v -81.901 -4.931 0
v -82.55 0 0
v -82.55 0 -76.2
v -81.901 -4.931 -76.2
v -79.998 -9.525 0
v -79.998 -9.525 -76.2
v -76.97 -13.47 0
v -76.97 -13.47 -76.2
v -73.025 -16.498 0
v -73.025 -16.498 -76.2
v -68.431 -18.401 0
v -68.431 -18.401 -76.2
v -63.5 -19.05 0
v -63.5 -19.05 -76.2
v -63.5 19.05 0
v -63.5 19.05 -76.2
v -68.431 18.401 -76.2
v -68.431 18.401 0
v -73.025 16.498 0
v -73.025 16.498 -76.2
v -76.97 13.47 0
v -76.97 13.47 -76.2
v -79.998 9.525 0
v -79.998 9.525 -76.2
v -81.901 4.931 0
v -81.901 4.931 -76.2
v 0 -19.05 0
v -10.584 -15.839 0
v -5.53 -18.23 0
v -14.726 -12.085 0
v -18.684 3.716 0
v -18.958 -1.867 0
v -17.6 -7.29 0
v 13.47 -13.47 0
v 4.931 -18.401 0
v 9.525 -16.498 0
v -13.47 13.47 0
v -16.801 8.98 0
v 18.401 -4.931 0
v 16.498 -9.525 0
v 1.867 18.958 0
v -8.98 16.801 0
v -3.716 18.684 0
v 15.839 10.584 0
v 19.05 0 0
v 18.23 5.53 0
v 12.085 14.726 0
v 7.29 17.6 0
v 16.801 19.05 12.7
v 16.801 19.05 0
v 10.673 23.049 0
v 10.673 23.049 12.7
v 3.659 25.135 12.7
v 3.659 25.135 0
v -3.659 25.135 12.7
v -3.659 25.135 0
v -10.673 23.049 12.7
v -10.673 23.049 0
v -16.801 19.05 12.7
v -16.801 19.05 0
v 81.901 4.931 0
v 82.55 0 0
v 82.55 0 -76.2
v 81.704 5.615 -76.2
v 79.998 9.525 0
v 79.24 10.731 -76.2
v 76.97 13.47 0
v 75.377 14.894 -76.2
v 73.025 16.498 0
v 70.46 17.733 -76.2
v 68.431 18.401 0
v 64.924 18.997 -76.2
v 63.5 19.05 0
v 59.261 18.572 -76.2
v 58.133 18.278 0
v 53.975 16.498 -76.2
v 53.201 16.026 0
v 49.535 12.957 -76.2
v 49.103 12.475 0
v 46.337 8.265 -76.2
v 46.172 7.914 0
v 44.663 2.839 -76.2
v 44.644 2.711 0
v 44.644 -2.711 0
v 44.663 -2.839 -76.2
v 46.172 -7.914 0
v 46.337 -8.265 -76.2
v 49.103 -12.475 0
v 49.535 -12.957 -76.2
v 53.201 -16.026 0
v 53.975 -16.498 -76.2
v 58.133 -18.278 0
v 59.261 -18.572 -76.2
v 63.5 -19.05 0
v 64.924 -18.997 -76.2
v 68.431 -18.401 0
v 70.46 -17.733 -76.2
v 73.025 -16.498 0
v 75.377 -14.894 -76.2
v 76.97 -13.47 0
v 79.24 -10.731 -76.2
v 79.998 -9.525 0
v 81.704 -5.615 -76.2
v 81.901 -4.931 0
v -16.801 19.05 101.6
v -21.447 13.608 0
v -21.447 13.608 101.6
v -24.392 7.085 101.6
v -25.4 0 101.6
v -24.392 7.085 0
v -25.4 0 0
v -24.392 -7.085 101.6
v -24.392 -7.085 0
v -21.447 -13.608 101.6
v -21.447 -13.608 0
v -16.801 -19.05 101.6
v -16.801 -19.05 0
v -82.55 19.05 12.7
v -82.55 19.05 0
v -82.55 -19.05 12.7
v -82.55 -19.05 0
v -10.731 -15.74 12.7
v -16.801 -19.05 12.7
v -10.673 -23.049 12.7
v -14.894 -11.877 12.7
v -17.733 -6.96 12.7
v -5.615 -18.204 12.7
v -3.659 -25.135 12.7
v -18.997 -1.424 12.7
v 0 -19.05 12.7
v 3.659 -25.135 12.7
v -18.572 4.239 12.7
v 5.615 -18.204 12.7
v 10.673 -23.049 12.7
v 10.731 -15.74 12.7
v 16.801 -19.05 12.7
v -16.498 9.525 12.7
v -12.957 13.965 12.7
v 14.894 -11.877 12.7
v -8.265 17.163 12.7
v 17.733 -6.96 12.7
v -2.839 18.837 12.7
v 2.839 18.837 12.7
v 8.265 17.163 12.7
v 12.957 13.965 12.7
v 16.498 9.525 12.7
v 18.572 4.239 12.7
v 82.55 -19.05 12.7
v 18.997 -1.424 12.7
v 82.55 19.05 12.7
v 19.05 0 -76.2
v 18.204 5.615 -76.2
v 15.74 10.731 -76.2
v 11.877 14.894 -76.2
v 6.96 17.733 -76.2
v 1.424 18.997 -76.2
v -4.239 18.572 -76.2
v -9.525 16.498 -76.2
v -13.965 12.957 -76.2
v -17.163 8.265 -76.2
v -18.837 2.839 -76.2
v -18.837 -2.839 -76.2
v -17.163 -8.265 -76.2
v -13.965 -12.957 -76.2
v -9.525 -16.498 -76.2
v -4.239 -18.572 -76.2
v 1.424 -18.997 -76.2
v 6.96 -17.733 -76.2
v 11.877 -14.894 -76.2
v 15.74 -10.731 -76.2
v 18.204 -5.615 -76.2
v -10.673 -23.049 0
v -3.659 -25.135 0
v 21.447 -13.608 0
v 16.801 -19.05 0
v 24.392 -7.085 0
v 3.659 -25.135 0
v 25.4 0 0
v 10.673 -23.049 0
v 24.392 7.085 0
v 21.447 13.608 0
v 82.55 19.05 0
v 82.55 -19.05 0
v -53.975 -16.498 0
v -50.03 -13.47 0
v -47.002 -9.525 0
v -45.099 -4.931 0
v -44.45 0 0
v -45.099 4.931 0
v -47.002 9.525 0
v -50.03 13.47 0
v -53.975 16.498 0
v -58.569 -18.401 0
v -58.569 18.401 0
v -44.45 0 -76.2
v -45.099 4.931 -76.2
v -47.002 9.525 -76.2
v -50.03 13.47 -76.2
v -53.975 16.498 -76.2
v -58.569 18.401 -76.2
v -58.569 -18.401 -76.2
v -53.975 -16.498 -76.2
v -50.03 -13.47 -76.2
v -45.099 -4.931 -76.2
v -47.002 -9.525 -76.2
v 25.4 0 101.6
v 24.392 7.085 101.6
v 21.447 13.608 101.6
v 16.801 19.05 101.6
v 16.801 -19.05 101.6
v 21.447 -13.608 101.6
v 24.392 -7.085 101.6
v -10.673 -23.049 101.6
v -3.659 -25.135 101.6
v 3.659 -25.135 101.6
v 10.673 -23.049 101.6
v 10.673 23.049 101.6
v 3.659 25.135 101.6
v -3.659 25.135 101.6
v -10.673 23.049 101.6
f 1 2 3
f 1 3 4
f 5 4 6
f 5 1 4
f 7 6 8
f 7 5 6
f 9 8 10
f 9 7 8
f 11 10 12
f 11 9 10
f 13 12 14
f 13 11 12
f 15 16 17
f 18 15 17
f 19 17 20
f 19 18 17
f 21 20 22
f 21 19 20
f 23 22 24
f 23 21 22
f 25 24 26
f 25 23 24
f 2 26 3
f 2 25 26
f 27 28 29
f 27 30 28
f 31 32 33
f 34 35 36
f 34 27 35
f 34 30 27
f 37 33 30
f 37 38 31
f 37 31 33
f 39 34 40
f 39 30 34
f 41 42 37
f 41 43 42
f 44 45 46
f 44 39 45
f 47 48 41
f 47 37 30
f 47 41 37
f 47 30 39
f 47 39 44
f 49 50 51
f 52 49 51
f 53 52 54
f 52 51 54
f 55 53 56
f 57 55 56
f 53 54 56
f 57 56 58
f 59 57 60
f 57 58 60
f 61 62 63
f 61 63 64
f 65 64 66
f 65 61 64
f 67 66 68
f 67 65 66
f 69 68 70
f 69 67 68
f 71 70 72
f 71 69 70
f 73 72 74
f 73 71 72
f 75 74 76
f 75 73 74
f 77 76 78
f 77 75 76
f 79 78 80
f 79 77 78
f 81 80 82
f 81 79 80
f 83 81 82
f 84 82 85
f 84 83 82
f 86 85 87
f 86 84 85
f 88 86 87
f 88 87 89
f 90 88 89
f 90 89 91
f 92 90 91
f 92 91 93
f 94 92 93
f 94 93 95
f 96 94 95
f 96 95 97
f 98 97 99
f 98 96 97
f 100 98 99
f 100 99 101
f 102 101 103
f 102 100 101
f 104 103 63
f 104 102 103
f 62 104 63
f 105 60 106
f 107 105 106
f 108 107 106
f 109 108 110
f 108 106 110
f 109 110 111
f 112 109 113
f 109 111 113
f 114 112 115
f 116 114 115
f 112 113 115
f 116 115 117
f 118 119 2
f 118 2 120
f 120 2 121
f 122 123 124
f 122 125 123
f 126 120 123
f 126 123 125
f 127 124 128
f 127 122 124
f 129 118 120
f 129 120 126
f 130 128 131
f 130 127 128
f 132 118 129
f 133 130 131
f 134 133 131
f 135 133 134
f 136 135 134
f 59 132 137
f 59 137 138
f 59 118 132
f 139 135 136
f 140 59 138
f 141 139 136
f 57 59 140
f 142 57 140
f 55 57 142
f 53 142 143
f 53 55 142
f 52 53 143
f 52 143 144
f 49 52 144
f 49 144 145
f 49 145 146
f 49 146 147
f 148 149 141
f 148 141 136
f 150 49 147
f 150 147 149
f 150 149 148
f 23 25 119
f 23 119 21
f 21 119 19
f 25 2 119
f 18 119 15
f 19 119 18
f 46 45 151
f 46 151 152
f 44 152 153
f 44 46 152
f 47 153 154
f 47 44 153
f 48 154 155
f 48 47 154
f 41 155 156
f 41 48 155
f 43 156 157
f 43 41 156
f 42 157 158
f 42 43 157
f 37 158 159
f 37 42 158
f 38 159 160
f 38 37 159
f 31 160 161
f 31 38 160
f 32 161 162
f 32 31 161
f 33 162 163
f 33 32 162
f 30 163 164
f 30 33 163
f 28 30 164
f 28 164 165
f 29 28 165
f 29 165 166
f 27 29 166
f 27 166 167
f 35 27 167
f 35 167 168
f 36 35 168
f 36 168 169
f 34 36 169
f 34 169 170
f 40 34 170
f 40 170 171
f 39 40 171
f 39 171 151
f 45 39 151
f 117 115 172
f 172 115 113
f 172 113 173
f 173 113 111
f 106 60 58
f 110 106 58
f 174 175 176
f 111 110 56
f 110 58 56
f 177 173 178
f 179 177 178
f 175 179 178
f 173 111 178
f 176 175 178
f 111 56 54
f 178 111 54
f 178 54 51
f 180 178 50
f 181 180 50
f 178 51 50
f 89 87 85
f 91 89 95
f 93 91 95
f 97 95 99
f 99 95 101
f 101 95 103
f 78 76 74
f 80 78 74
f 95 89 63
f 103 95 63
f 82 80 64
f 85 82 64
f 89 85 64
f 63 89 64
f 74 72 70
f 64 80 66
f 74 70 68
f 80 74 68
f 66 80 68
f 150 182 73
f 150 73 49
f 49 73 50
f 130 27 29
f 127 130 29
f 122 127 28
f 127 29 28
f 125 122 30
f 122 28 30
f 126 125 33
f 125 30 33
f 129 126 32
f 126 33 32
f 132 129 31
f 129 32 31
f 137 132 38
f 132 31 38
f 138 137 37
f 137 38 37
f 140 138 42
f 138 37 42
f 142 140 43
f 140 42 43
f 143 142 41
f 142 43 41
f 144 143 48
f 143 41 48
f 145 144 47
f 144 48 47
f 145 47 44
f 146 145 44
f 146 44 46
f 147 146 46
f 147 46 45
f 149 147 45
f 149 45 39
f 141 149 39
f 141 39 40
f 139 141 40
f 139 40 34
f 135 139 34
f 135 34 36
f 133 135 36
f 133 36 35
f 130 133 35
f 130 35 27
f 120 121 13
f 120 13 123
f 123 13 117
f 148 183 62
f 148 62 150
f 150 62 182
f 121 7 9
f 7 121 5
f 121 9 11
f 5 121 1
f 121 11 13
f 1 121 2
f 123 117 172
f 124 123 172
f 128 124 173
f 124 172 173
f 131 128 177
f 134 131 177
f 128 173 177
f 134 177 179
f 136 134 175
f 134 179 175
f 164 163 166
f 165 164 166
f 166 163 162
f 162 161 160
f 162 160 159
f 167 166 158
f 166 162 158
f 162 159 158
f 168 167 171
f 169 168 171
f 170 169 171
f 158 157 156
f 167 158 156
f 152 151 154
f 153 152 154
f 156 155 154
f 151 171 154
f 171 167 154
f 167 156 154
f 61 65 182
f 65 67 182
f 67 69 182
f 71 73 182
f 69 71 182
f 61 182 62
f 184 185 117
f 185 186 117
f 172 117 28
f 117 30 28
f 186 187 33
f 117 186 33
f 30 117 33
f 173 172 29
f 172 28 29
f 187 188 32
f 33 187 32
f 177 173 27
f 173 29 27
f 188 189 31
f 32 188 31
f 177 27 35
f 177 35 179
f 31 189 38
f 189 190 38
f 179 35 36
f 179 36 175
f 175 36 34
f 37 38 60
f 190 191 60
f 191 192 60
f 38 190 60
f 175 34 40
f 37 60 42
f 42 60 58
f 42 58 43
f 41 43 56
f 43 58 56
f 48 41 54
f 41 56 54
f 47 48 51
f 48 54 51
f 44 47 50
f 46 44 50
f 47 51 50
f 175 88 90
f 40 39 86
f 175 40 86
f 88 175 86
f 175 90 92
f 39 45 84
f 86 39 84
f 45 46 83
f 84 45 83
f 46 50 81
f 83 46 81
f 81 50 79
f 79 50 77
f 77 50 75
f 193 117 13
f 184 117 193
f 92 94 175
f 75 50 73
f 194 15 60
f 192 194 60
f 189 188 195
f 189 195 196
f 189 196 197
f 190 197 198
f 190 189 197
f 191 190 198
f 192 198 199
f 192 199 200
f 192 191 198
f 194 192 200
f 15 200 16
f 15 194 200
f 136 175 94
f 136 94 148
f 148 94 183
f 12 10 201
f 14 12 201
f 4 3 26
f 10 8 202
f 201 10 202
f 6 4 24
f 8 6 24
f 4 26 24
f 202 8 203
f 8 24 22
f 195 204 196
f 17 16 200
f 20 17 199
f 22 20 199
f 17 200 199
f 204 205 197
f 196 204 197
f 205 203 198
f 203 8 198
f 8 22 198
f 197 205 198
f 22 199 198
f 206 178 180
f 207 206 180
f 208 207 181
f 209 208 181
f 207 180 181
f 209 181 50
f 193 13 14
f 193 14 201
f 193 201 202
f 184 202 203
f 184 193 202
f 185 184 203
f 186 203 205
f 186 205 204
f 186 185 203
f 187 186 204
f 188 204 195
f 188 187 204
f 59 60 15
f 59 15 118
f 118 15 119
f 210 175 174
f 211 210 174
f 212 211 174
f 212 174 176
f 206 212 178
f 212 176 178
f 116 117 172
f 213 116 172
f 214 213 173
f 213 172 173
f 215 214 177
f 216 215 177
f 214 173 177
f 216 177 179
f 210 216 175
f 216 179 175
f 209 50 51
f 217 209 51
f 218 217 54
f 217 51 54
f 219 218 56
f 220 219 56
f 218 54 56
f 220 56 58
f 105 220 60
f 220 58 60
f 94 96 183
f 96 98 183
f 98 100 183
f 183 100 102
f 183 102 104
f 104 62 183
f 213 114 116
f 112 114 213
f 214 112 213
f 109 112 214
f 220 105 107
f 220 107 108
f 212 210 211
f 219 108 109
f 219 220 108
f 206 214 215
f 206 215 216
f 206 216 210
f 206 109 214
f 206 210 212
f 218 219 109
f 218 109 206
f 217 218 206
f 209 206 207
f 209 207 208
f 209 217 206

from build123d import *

# Parameters (mm, degrees)
F1_DEPTH = 12.7
F2_DEPTH = 76.2
F3_DEPTH = 101.6


with BuildPart() as f1:
    # F0 (on Top) → F1 (new body)
    with BuildSketch(Plane.XY):
        with BuildLine():
            Line((82.55, 0), (82.55, 19.05))
            Line((82.55, 19.05), (63.5, 19.05))
            ThreePointArc((63.5, 19.05), (76.9703841816, 13.4703841816), (82.55, 0))
        make_face()
        with BuildLine():
            ThreePointArc((63.5, -19.05), (44.45, 0), (63.5, 19.05))
            Line((63.5, 19.05), (16.8005208253, 19.05))
            ThreePointArc((16.8005208253, 19.05), (23.1505208253, 10.4505208253), (25.4, 0))
            ThreePointArc((25.4, 0), (23.1505208253, -10.4505208253), (16.8005208253, -19.05))
            Line((16.8005208253, -19.05), (63.5, -19.05))
        make_face()
        with BuildLine():
            ThreePointArc((82.55, 0), (76.9703841816, 13.4703841816), (63.5, 19.05))
            ThreePointArc((63.5, 19.05), (44.45, 0), (63.5, -19.05))
            ThreePointArc((63.5, -19.05), (76.9703841816, -13.4703841816), (82.55, 0))
        make_face()
        with BuildLine():
            Line((82.55, -19.05), (82.55, 0))
            ThreePointArc((82.55, 0), (76.9703841816, -13.4703841816), (63.5, -19.05))
            Line((63.5, -19.05), (82.55, -19.05))
        make_face()
        with BuildLine():
            ThreePointArc((25.4, 0), (23.1505208253, 10.4505208253), (16.8005208253, 19.05))
            Line((16.8005208253, 19.05), (-5.96e-08, 19.05))
            ThreePointArc((-5.96e-08, 19.05), (13.4703841605, 13.4703842027), (19.05, 0))
            ThreePointArc((19.05, 0), (13.4703841555, -13.4703842077), (-7.38e-08, -19.05))
            Line((-7.38e-08, -19.05), (16.8005208253, -19.05))
            ThreePointArc((16.8005208253, -19.05), (23.1505208253, -10.4505208253), (25.4, 0))
        make_face()
        with BuildLine():
            Line((-5.96e-08, 19.05), (16.8005208253, 19.05))
            ThreePointArc((16.8005208253, 19.05), (0, 25.4), (-16.8005208253, 19.05))
            Line((-16.8005208253, 19.05), (-5.96e-08, 19.05))
        make_face()
        with BuildLine():
            ThreePointArc((-7.38e-08, -19.05), (-19.05, 7.1e-09), (-5.96e-08, 19.05))
            Line((-5.96e-08, 19.05), (-16.8005208253, 19.05))
            ThreePointArc((-16.8005208253, 19.05), (-25.4, 0), (-16.8005208253, -19.05))
            Line((-16.8005208253, -19.05), (-7.38e-08, -19.05))
        make_face()
        with BuildLine():
            ThreePointArc((-16.8005208253, -19.05), (-25.4, 0), (-16.8005208253, 19.05))
            Line((-16.8005208253, 19.05), (-63.5, 19.05))
            ThreePointArc((-63.5, 19.05), (-50.0296158184, 13.4703841816), (-44.45, 0))
            ThreePointArc((-44.45, 0), (-50.0296158184, -13.4703841816), (-63.5, -19.05))
            Line((-63.5, -19.05), (-16.8005208253, -19.05))
        make_face()
        with BuildLine():
            ThreePointArc((-16.8005208253, -19.05), (0, -25.4), (16.8005208253, -19.05))
            Line((16.8005208253, -19.05), (-7.38e-08, -19.05))
            Line((-7.38e-08, -19.05), (-16.8005208253, -19.05))
        make_face()
        with BuildLine():
            ThreePointArc((-82.55, 1.56e-07), (-76.9703841264, 13.4703842368), (-63.5, 19.05))
            Line((-63.5, 19.05), (-82.55, 19.05))
            Line((-82.55, 19.05), (-82.55, 1.56e-07))
        make_face()
        with BuildLine():
            ThreePointArc((-44.45, 0), (-50.0296158184, 13.4703841816), (-63.5, 19.05))
            ThreePointArc((-63.5, 19.05), (-76.9703841264, 13.4703842368), (-82.55, 1.56e-07))
            ThreePointArc((-82.55, 1.56e-07), (-76.9703842368, -13.4703841264), (-63.5, -19.05))
            ThreePointArc((-63.5, -19.05), (-50.0296158184, -13.4703841816), (-44.45, 0))
        make_face()
        with BuildLine():
            ThreePointArc((-63.5, -19.05), (-76.9703842368, -13.4703841264), (-82.55, 1.56e-07))
            Line((-82.55, 1.56e-07), (-82.55, -19.05))
            Line((-82.55, -19.05), (-63.5, -19.05))
        make_face()
    extrude(amount=F1_DEPTH)

    # F0 (on Top) → F2 (join)
    with BuildSketch(Plane.XY):
        with BuildLine():
            ThreePointArc((-44.45, 0), (-50.0296158184, 13.4703841816), (-63.5, 19.05))
            ThreePointArc((-63.5, 19.05), (-76.9703841264, 13.4703842368), (-82.55, 1.56e-07))
            ThreePointArc((-82.55, 1.56e-07), (-76.9703842368, -13.4703841264), (-63.5, -19.05))
            ThreePointArc((-63.5, -19.05), (-50.0296158184, -13.4703841816), (-44.45, 0))
        make_face()
        with BuildLine():
            ThreePointArc((19.05, 0), (13.4703841605, 13.4703842027), (-5.96e-08, 19.05))
            ThreePointArc((-5.96e-08, 19.05), (-19.05, 7.1e-09), (-7.38e-08, -19.05))
            ThreePointArc((-7.38e-08, -19.05), (13.4703841555, -13.4703842077), (19.05, 0))
        make_face()
        with BuildLine():
            ThreePointArc((82.55, 0), (76.9703841816, 13.4703841816), (63.5, 19.05))
            ThreePointArc((63.5, 19.05), (44.45, 0), (63.5, -19.05))
            ThreePointArc((63.5, -19.05), (76.9703841816, -13.4703841816), (82.55, 0))
        make_face()
    extrude(amount=-F2_DEPTH)


with BuildPart() as f3:
    # F0 (on Top) → F3 (new body)
    with BuildSketch(Plane.XY):
        with BuildLine():
            ThreePointArc((-7.38e-08, -19.05), (-19.05, 7.1e-09), (-5.96e-08, 19.05))
            Line((-5.96e-08, 19.05), (-16.8005208253, 19.05))
            ThreePointArc((-16.8005208253, 19.05), (-25.4, 0), (-16.8005208253, -19.05))
            Line((-16.8005208253, -19.05), (-7.38e-08, -19.05))
        make_face()
        with BuildLine():
            ThreePointArc((19.05, 0), (13.4703841605, 13.4703842027), (-5.96e-08, 19.05))
            ThreePointArc((-5.96e-08, 19.05), (-19.05, 7.1e-09), (-7.38e-08, -19.05))
            ThreePointArc((-7.38e-08, -19.05), (13.4703841555, -13.4703842077), (19.05, 0))
        make_face()
        with BuildLine():
            ThreePointArc((-16.8005208253, -19.05), (0, -25.4), (16.8005208253, -19.05))
            Line((16.8005208253, -19.05), (-7.38e-08, -19.05))
            Line((-7.38e-08, -19.05), (-16.8005208253, -19.05))
        make_face()
        with BuildLine():
            ThreePointArc((25.4, 0), (23.1505208253, 10.4505208253), (16.8005208253, 19.05))
            Line((16.8005208253, 19.05), (-5.96e-08, 19.05))
            ThreePointArc((-5.96e-08, 19.05), (13.4703841605, 13.4703842027), (19.05, 0))
            ThreePointArc((19.05, 0), (13.4703841555, -13.4703842077), (-7.38e-08, -19.05))
            Line((-7.38e-08, -19.05), (16.8005208253, -19.05))
            ThreePointArc((16.8005208253, -19.05), (23.1505208253, -10.4505208253), (25.4, 0))
        make_face()
        with BuildLine():
            Line((-5.96e-08, 19.05), (16.8005208253, 19.05))
            ThreePointArc((16.8005208253, 19.05), (0, 25.4), (-16.8005208253, 19.05))
            Line((-16.8005208253, 19.05), (-5.96e-08, 19.05))
        make_face()
    extrude(amount=F3_DEPTH)


solid = Compound([f1.part, f3.part])
